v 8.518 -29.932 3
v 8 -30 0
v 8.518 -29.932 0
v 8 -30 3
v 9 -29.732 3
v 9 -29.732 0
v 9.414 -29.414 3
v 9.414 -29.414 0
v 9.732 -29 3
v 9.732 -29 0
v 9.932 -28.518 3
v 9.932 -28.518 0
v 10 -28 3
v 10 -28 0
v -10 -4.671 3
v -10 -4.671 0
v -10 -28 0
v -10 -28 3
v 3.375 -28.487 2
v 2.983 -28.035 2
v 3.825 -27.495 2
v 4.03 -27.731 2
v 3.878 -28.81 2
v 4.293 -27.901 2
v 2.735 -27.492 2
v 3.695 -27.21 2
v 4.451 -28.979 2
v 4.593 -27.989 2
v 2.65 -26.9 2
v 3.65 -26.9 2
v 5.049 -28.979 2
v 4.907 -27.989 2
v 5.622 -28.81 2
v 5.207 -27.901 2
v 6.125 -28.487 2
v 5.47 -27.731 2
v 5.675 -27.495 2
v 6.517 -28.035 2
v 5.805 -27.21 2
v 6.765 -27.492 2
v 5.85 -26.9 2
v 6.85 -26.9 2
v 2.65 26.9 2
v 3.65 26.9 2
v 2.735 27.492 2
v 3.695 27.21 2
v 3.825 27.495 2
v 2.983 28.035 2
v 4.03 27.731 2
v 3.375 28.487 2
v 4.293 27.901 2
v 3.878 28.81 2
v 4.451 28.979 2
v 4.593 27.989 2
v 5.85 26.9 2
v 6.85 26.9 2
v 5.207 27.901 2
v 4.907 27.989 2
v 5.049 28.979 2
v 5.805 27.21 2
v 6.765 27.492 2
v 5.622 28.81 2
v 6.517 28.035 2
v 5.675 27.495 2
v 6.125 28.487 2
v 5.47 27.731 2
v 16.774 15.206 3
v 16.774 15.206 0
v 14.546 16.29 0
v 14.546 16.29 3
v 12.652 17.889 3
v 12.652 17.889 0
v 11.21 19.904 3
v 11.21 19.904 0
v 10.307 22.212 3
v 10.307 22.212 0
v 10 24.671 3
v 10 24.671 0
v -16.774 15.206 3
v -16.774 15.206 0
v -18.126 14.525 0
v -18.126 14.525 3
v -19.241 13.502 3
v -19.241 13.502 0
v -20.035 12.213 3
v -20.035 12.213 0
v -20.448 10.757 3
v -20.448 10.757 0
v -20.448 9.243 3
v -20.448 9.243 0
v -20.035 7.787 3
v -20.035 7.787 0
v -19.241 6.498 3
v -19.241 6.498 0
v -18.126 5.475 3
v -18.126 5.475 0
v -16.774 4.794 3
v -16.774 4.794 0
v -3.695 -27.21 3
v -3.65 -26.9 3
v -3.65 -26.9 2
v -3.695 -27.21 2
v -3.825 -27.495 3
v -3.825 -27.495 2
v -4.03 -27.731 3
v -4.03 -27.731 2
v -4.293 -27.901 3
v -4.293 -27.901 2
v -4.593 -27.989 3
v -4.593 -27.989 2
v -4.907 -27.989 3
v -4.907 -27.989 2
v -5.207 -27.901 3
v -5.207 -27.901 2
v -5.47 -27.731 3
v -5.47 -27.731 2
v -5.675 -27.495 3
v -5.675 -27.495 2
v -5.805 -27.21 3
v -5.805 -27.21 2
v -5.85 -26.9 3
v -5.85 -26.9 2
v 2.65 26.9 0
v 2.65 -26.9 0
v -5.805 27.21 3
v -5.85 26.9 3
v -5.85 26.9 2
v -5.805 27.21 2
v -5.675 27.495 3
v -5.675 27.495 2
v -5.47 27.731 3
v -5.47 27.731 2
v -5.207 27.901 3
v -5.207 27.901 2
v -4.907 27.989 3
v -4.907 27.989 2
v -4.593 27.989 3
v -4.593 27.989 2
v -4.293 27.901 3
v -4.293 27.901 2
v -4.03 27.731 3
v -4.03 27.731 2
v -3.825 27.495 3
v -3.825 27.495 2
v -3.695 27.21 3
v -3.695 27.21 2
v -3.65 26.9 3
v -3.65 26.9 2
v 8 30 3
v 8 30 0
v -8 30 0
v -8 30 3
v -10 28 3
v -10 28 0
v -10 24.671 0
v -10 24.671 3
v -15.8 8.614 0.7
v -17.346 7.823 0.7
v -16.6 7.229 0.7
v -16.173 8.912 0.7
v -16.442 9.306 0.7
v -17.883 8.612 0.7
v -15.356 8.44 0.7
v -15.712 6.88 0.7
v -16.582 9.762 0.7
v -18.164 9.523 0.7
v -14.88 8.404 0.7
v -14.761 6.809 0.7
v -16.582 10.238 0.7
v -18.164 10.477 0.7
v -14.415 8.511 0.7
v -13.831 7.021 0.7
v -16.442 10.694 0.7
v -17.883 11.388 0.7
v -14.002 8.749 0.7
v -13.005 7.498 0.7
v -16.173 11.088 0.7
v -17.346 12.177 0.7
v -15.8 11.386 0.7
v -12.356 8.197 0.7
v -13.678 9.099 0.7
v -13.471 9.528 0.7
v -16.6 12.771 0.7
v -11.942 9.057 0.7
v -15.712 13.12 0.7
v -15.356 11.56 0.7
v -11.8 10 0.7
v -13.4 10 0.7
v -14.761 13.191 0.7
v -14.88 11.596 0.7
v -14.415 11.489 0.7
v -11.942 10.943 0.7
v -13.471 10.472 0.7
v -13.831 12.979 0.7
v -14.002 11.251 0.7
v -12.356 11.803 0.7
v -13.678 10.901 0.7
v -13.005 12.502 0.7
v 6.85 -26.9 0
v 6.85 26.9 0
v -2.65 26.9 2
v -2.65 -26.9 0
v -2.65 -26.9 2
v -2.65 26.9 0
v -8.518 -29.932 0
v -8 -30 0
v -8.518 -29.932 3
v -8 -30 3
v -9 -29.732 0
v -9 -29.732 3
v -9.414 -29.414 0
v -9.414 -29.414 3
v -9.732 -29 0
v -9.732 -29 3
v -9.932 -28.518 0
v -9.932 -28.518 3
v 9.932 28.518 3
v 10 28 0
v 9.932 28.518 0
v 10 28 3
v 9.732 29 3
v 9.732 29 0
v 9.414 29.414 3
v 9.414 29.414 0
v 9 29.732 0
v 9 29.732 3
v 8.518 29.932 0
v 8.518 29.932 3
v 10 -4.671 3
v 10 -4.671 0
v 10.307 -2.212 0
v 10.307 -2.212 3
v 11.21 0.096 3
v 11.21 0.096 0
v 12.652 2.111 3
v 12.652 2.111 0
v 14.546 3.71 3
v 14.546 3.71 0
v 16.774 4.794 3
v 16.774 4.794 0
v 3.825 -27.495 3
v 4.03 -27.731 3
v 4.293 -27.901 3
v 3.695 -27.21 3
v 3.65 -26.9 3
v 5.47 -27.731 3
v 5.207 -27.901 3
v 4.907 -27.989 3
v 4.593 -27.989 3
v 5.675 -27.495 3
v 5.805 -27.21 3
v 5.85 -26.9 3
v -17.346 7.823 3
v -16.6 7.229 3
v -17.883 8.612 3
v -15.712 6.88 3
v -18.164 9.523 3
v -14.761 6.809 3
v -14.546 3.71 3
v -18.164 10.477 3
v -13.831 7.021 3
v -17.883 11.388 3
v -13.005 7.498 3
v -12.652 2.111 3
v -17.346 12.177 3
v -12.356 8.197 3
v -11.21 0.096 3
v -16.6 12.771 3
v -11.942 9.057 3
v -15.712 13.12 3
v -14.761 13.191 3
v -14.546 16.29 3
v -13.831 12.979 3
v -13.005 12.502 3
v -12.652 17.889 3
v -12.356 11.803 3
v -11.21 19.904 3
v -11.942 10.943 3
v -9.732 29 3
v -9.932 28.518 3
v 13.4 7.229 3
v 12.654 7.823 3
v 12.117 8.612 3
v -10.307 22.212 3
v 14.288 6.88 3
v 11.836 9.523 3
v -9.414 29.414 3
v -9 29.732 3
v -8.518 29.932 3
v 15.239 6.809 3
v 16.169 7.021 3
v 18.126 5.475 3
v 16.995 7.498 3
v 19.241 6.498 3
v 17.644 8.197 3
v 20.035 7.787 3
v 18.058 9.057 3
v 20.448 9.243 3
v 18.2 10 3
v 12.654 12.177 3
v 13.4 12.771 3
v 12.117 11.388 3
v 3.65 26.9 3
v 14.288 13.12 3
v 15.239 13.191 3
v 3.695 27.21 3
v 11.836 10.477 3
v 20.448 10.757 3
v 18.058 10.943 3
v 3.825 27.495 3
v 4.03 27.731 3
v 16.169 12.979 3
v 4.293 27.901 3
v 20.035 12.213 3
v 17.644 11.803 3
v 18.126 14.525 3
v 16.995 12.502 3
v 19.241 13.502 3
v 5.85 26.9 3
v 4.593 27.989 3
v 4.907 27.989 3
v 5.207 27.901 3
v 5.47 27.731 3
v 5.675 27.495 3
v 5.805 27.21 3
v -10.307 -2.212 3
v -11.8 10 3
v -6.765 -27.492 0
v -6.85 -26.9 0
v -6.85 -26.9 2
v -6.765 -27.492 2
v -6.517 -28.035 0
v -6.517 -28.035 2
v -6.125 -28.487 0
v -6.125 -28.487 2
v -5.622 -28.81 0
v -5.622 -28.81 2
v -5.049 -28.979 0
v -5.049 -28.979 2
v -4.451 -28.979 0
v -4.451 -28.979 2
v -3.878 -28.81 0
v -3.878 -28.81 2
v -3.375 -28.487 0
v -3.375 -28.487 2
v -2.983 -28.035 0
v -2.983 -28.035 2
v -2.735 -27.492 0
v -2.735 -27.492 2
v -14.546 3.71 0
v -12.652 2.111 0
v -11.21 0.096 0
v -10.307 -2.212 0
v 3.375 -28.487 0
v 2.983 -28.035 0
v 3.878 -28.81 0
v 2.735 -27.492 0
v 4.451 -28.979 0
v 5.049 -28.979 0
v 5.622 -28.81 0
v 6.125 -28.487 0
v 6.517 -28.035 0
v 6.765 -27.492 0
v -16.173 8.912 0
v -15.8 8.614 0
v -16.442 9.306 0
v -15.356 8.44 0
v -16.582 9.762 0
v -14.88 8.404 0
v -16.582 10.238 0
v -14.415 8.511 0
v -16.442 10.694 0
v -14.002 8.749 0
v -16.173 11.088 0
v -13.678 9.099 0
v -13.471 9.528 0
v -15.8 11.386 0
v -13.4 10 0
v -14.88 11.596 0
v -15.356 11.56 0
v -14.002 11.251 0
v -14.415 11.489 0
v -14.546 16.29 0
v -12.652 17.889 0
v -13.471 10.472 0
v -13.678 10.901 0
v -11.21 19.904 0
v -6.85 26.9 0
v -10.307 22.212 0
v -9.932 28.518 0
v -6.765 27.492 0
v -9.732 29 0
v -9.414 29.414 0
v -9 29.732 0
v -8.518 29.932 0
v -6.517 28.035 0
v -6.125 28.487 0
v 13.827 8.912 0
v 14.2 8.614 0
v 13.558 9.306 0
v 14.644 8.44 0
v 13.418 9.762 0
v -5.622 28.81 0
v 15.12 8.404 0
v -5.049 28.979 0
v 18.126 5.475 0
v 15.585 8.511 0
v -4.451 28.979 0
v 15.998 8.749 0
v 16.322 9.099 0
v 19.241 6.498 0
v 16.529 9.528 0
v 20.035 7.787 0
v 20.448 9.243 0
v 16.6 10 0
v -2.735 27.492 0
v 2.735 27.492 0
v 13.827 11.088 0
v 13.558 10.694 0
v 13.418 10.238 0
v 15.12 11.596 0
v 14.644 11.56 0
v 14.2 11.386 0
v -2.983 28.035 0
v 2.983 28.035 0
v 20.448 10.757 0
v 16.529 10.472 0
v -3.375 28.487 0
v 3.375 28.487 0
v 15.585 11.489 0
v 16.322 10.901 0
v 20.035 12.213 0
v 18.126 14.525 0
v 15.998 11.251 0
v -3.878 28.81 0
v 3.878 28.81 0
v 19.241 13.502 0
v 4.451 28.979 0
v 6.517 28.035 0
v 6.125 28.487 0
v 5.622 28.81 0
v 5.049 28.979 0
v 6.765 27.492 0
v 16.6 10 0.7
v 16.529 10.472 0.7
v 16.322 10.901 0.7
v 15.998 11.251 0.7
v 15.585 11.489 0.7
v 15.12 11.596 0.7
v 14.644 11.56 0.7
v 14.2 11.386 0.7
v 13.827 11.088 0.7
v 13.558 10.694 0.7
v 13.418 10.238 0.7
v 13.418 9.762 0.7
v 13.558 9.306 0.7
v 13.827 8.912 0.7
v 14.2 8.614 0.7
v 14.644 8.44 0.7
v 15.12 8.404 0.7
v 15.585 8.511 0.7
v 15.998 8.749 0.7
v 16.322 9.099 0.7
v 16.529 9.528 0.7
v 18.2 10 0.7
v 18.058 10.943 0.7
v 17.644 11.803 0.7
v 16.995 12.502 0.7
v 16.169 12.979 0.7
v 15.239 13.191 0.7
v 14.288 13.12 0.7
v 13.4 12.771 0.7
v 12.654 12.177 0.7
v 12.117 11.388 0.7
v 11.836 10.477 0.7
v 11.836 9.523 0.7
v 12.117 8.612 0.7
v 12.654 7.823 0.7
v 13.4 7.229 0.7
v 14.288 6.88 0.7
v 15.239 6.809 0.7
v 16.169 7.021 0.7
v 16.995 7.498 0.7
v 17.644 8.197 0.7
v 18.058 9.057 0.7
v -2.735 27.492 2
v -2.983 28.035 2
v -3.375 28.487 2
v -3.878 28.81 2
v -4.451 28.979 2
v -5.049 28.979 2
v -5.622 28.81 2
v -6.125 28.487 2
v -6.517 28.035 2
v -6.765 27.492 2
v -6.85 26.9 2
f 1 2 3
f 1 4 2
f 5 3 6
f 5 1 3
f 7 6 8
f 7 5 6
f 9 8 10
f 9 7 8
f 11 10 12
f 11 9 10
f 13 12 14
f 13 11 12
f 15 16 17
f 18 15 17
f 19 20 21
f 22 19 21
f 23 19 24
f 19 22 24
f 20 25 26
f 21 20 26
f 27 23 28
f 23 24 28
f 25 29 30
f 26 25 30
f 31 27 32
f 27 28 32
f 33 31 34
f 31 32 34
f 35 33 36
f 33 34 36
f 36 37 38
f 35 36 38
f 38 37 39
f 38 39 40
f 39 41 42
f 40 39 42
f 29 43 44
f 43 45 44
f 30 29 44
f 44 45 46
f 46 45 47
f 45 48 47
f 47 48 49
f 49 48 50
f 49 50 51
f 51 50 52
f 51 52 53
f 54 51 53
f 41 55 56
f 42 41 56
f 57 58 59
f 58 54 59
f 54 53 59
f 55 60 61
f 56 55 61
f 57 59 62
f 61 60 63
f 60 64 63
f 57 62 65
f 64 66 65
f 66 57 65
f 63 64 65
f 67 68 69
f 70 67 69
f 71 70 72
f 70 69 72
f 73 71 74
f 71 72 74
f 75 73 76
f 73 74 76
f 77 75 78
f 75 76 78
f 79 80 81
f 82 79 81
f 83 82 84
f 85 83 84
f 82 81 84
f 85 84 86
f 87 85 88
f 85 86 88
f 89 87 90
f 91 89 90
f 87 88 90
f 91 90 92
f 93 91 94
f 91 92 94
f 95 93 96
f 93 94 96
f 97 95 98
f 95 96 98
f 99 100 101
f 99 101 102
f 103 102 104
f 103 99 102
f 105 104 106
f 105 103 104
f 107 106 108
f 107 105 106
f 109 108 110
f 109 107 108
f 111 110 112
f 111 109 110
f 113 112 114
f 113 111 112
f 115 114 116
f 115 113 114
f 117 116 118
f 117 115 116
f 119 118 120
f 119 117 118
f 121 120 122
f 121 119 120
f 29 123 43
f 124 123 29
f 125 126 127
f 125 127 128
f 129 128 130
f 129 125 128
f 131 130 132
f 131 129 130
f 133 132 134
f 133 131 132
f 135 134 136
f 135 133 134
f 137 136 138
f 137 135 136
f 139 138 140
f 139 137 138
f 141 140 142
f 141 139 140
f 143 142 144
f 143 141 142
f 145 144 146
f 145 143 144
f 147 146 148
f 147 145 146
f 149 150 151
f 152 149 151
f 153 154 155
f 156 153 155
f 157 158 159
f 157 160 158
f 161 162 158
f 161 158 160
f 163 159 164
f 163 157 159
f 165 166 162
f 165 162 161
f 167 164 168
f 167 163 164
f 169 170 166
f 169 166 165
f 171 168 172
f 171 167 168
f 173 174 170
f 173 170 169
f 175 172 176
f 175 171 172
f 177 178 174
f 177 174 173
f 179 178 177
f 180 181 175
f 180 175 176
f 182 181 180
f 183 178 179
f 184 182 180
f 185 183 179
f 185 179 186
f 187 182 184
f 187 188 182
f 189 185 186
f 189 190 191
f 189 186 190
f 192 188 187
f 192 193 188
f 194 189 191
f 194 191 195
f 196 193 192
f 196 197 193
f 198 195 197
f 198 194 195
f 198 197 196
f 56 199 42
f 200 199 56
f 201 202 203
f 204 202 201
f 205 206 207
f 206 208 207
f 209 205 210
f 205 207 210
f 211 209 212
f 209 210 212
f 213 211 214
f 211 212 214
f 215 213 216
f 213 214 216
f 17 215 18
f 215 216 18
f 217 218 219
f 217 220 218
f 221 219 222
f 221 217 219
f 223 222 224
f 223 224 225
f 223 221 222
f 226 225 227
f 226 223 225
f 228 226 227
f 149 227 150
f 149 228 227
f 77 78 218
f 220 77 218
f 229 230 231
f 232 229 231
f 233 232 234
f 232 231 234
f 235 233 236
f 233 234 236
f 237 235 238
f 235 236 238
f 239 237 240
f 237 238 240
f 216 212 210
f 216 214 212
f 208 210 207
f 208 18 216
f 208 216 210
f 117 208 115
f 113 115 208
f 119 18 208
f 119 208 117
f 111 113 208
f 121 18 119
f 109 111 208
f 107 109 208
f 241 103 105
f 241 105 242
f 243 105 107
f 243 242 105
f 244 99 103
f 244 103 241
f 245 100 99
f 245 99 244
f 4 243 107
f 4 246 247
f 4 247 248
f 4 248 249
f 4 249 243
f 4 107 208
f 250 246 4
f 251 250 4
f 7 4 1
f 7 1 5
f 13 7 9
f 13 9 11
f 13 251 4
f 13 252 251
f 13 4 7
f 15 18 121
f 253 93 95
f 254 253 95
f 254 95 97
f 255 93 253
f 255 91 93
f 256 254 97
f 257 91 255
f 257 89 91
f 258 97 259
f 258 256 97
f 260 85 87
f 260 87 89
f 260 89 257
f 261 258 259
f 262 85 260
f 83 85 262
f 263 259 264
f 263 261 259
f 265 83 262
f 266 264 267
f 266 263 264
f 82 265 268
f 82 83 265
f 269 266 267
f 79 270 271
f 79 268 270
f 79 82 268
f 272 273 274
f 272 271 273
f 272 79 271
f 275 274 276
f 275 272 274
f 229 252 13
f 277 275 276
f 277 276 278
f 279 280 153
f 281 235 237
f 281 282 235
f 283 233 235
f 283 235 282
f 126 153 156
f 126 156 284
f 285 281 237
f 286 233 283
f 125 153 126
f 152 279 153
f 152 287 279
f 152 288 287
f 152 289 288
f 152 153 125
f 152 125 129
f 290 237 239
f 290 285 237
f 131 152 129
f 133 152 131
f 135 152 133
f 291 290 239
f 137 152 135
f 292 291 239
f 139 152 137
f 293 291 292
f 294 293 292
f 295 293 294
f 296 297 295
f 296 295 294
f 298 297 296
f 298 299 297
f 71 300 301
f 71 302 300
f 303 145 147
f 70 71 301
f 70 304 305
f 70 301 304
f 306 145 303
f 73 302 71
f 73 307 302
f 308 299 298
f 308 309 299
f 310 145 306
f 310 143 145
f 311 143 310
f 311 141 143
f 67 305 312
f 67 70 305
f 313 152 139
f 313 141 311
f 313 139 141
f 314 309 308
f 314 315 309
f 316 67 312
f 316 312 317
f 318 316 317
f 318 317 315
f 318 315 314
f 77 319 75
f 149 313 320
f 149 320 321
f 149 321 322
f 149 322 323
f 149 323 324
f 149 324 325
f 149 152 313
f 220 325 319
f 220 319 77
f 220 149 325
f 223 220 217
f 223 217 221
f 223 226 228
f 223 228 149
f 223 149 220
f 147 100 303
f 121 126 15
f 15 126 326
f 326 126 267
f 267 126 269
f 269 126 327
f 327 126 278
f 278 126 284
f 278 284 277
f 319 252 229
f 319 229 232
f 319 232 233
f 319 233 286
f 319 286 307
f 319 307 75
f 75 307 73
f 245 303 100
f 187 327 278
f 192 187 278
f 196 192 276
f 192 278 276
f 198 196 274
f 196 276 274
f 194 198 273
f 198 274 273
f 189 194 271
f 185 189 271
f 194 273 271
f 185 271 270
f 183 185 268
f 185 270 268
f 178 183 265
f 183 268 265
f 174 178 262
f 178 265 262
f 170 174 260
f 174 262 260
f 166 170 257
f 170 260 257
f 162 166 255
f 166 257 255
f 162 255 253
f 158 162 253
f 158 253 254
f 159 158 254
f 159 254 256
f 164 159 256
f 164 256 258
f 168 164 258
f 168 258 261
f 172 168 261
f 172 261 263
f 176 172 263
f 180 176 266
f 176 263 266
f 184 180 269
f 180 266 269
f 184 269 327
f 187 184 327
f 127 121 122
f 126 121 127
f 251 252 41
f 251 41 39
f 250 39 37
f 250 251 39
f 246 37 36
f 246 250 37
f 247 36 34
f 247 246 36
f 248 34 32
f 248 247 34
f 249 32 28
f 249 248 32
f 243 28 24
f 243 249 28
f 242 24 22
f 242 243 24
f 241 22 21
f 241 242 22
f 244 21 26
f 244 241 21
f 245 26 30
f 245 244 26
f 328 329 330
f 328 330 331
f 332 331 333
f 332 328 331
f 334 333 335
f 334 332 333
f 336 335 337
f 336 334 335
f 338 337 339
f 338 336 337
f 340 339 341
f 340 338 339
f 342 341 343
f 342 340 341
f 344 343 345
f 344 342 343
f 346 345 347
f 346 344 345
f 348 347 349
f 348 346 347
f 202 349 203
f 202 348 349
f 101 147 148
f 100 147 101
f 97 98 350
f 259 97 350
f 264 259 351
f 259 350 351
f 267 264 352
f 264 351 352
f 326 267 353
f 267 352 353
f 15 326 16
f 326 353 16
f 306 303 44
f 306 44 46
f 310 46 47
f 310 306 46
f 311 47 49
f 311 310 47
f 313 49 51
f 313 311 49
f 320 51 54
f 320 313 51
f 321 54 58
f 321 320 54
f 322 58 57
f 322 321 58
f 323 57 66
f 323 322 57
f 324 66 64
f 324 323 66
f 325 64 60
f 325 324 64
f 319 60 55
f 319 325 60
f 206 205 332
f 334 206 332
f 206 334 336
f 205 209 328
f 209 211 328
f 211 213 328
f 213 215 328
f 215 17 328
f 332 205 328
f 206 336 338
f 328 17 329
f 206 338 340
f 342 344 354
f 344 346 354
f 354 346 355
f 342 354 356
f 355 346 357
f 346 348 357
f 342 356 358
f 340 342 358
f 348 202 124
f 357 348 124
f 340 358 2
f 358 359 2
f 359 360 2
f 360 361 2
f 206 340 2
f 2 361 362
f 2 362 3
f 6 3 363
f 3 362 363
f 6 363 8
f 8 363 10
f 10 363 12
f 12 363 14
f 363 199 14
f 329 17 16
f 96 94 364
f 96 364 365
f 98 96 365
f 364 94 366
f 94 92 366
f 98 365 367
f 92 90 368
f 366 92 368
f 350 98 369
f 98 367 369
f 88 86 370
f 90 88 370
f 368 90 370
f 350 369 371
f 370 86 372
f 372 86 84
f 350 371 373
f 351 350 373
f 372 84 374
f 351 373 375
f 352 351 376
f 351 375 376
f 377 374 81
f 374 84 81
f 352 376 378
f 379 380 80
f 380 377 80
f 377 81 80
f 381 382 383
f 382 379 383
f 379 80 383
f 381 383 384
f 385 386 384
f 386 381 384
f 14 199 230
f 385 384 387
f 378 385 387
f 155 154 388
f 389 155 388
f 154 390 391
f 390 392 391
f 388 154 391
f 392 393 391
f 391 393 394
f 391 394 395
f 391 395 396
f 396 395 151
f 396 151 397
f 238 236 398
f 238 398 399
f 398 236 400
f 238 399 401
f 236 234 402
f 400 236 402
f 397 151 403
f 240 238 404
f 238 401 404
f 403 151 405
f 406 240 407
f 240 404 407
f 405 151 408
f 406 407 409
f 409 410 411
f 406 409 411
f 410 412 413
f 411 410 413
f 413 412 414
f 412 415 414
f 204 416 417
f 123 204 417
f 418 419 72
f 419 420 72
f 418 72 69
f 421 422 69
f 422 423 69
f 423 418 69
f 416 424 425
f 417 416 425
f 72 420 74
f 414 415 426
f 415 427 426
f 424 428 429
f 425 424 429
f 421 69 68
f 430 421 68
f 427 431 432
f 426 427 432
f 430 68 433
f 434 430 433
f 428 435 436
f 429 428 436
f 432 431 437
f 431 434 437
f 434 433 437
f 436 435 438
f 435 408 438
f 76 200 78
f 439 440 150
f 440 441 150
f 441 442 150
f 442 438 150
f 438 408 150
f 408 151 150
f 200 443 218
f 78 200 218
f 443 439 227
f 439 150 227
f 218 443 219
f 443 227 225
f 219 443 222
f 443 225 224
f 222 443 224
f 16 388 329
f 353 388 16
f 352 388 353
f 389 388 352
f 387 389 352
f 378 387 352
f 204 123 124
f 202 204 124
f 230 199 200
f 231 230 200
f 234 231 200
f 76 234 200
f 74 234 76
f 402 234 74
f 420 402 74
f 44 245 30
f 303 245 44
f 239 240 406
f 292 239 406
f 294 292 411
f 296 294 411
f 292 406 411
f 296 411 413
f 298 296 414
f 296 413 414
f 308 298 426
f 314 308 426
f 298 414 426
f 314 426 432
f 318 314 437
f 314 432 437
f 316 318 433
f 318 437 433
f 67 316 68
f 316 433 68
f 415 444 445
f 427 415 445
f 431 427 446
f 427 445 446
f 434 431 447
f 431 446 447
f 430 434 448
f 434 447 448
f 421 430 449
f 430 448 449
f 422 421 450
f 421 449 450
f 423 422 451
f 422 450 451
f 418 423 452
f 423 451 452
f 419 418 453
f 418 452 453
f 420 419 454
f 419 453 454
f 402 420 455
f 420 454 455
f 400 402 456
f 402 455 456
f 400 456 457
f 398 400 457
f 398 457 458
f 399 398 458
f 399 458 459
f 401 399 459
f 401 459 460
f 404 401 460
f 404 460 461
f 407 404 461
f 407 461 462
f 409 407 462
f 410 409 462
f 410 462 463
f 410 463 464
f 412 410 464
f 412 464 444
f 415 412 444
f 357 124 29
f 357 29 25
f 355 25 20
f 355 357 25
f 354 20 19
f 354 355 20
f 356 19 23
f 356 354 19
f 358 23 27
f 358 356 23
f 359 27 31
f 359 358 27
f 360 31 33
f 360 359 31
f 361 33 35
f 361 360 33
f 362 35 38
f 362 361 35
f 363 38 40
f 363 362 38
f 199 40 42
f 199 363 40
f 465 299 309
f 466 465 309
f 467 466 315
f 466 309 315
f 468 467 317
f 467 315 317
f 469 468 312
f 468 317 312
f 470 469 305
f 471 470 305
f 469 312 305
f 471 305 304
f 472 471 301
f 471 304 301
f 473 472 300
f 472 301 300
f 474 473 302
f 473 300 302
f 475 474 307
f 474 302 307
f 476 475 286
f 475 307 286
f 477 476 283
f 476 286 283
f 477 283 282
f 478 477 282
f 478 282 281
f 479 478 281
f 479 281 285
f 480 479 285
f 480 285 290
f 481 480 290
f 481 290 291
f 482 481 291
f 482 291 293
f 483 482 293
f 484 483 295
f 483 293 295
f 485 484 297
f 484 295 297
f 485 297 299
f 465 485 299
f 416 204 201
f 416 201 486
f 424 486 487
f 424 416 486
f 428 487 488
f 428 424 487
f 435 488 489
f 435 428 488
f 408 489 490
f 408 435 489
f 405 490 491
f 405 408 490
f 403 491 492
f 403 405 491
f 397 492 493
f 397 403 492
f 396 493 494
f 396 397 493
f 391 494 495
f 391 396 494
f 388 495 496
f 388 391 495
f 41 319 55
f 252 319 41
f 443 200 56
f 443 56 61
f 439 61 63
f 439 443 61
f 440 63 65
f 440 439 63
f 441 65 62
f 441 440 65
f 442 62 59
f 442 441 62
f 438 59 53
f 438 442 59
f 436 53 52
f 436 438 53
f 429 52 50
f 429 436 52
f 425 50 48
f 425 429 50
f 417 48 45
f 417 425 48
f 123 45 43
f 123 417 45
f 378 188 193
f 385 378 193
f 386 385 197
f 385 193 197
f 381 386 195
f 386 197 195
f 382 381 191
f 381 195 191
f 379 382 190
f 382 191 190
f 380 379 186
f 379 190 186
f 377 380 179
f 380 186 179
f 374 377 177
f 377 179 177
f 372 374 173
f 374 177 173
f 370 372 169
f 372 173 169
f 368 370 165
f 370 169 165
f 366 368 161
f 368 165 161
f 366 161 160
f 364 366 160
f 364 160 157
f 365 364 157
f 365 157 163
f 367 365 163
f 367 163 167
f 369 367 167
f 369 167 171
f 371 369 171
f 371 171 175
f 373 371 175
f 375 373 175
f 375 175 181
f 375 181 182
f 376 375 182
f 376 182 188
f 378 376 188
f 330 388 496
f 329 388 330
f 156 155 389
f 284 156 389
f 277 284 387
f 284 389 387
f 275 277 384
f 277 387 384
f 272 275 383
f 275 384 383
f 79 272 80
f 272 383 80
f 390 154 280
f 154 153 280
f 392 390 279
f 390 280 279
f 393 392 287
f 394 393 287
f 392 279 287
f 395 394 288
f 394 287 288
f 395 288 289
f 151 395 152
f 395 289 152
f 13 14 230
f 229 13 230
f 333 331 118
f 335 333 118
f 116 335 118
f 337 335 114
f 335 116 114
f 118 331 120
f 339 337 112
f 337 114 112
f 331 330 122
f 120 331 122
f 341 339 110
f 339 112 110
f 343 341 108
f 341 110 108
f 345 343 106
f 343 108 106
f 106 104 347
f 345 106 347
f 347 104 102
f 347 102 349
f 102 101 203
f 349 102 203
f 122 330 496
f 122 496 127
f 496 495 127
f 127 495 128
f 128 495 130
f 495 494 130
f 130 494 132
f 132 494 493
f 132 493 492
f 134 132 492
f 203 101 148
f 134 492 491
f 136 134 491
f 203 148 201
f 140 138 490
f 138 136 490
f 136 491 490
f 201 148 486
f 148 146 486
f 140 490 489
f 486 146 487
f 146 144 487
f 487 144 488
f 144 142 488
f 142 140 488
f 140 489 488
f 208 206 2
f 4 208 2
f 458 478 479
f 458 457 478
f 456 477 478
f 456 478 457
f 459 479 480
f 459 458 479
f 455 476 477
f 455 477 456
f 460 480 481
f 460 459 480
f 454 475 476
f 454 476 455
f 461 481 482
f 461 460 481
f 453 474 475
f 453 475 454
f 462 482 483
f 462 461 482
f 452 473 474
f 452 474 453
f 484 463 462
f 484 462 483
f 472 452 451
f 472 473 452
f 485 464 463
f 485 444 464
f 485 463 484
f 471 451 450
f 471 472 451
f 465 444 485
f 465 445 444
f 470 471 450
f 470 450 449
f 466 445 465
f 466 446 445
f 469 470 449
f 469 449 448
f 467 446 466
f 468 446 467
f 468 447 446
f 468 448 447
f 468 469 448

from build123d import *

# Parameters (mm, degrees)
BOSS_EXTRUDE1_DEPTH = 3
SKETCH2_R           = 1.6
CUT_EXTRUDE1_DEPTH  = 37.458880948
SKETCH3_R           = 3.2
CUT_EXTRUDE2_DEPTH  = 2.3
CUT_EXTRUDE3_DEPTH  = 2
FILLET1_R           = 2


with BuildPart() as part:
    # Sketch1 → Boss-Extrude1 (new body)
    with BuildSketch(Plane.XY):
        with BuildLine():
            Line((-10, -30), (10, -30))
            Line((10, -30), (10, -4.671400751))
            ThreePointArc((10, -4.671400751), (11.868024086, 1.148476201), (16.774193548, 4.794019088))
            ThreePointArc((16.774193548, 4.794019088), (20.5, 10), (16.774193548, 15.205980912))
            ThreePointArc((16.774193548, 15.205980912), (11.868024086, 18.851523799), (10, 24.671400751))
            Line((10, 24.671400751), (10, 30))
            Line((10, 30), (-10, 30))
            Line((-10, 30), (-10, 24.671400751))
            ThreePointArc((-10, 24.671400751), (-11.868024086, 18.851523799), (-16.774193548, 15.205980912))
            ThreePointArc((-16.774193548, 15.205980912), (-20.5, 10), (-16.774193548, 4.794019088))
            ThreePointArc((-16.774193548, 4.794019088), (-11.868024086, 1.148476201), (-10, -4.671400751))
            Line((-10, -4.671400751), (-10, -30))
        make_face()
    extrude(amount=BOSS_EXTRUDE1_DEPTH)

    # Sketch2 → Cut-Extrude1 (cut, through all)
    with BuildSketch(Plane.XY.offset(3)):
        with Locations((-15, 10)):
            Circle(SKETCH2_R)
        with Locations((15, 10)):
            Circle(SKETCH2_R)
        with BuildLine():
            Line((-3.65, 26.9), (-3.65, -26.9))
            ThreePointArc((-3.65, -26.9), (-4.75, -28), (-5.85, -26.9))
            Line((-5.85, -26.9), (-5.85, 26.9))
            ThreePointArc((-5.85, 26.9), (-4.75, 28), (-3.65, 26.9))
        make_face()
        with BuildLine():
            Line((5.85, 26.9), (5.85, -26.9))
            ThreePointArc((5.85, -26.9), (4.75, -28), (3.65, -26.9))
            Line((3.65, -26.9), (3.65, 26.9))
            ThreePointArc((3.65, 26.9), (4.75, 28), (5.85, 26.9))
        make_face()
    extrude(amount=-CUT_EXTRUDE1_DEPTH, mode=Mode.SUBTRACT)

    # Sketch3 → Cut-Extrude2 (cut)
    with BuildSketch(Plane.XY.offset(3)):
        with Locations((-15, 10)):
            Circle(SKETCH3_R)
        with Locations((15, 10)):
            Circle(SKETCH3_R)
    extrude(amount=-CUT_EXTRUDE2_DEPTH, mode=Mode.SUBTRACT)

    # Sketch4 → Cut-Extrude3 (cut)
    with BuildSketch(Plane(origin=(0, 0, 0), x_dir=(-1, 0, 0), z_dir=(0, 0, -1))):
        with BuildLine():
            Line((-2.65, 26.9), (-2.65, -26.9))
            ThreePointArc((-2.65, -26.9), (-4.75, -29), (-6.85, -26.9))
            Line((-6.85, -26.9), (-6.85, 26.9))
            ThreePointArc((-6.85, 26.9), (-4.75, 29), (-2.65, 26.9))
        make_face()
        with BuildLine():
            Line((2.65, -26.9), (2.65, 26.9))
            ThreePointArc((2.65, 26.9), (4.75, 29), (6.85, 26.9))
            Line((6.85, 26.9), (6.85, -26.9))
            ThreePointArc((6.85, -26.9), (4.75, -29), (2.65, -26.9))
        make_face()
    extrude(amount=-CUT_EXTRUDE3_DEPTH, mode=Mode.SUBTRACT)

    # Fillet1
    fillet1_edges = [part.edges().sort_by_distance(p)[0] for p in [
        (10, -30, 1.5),
        (-10, -30, 1.5),
        (-10, 30, 1.5),
        (10, 30, 1.5),
    ]]
    fillet(fillet1_edges, radius=FILLET1_R)


solid = part.part
